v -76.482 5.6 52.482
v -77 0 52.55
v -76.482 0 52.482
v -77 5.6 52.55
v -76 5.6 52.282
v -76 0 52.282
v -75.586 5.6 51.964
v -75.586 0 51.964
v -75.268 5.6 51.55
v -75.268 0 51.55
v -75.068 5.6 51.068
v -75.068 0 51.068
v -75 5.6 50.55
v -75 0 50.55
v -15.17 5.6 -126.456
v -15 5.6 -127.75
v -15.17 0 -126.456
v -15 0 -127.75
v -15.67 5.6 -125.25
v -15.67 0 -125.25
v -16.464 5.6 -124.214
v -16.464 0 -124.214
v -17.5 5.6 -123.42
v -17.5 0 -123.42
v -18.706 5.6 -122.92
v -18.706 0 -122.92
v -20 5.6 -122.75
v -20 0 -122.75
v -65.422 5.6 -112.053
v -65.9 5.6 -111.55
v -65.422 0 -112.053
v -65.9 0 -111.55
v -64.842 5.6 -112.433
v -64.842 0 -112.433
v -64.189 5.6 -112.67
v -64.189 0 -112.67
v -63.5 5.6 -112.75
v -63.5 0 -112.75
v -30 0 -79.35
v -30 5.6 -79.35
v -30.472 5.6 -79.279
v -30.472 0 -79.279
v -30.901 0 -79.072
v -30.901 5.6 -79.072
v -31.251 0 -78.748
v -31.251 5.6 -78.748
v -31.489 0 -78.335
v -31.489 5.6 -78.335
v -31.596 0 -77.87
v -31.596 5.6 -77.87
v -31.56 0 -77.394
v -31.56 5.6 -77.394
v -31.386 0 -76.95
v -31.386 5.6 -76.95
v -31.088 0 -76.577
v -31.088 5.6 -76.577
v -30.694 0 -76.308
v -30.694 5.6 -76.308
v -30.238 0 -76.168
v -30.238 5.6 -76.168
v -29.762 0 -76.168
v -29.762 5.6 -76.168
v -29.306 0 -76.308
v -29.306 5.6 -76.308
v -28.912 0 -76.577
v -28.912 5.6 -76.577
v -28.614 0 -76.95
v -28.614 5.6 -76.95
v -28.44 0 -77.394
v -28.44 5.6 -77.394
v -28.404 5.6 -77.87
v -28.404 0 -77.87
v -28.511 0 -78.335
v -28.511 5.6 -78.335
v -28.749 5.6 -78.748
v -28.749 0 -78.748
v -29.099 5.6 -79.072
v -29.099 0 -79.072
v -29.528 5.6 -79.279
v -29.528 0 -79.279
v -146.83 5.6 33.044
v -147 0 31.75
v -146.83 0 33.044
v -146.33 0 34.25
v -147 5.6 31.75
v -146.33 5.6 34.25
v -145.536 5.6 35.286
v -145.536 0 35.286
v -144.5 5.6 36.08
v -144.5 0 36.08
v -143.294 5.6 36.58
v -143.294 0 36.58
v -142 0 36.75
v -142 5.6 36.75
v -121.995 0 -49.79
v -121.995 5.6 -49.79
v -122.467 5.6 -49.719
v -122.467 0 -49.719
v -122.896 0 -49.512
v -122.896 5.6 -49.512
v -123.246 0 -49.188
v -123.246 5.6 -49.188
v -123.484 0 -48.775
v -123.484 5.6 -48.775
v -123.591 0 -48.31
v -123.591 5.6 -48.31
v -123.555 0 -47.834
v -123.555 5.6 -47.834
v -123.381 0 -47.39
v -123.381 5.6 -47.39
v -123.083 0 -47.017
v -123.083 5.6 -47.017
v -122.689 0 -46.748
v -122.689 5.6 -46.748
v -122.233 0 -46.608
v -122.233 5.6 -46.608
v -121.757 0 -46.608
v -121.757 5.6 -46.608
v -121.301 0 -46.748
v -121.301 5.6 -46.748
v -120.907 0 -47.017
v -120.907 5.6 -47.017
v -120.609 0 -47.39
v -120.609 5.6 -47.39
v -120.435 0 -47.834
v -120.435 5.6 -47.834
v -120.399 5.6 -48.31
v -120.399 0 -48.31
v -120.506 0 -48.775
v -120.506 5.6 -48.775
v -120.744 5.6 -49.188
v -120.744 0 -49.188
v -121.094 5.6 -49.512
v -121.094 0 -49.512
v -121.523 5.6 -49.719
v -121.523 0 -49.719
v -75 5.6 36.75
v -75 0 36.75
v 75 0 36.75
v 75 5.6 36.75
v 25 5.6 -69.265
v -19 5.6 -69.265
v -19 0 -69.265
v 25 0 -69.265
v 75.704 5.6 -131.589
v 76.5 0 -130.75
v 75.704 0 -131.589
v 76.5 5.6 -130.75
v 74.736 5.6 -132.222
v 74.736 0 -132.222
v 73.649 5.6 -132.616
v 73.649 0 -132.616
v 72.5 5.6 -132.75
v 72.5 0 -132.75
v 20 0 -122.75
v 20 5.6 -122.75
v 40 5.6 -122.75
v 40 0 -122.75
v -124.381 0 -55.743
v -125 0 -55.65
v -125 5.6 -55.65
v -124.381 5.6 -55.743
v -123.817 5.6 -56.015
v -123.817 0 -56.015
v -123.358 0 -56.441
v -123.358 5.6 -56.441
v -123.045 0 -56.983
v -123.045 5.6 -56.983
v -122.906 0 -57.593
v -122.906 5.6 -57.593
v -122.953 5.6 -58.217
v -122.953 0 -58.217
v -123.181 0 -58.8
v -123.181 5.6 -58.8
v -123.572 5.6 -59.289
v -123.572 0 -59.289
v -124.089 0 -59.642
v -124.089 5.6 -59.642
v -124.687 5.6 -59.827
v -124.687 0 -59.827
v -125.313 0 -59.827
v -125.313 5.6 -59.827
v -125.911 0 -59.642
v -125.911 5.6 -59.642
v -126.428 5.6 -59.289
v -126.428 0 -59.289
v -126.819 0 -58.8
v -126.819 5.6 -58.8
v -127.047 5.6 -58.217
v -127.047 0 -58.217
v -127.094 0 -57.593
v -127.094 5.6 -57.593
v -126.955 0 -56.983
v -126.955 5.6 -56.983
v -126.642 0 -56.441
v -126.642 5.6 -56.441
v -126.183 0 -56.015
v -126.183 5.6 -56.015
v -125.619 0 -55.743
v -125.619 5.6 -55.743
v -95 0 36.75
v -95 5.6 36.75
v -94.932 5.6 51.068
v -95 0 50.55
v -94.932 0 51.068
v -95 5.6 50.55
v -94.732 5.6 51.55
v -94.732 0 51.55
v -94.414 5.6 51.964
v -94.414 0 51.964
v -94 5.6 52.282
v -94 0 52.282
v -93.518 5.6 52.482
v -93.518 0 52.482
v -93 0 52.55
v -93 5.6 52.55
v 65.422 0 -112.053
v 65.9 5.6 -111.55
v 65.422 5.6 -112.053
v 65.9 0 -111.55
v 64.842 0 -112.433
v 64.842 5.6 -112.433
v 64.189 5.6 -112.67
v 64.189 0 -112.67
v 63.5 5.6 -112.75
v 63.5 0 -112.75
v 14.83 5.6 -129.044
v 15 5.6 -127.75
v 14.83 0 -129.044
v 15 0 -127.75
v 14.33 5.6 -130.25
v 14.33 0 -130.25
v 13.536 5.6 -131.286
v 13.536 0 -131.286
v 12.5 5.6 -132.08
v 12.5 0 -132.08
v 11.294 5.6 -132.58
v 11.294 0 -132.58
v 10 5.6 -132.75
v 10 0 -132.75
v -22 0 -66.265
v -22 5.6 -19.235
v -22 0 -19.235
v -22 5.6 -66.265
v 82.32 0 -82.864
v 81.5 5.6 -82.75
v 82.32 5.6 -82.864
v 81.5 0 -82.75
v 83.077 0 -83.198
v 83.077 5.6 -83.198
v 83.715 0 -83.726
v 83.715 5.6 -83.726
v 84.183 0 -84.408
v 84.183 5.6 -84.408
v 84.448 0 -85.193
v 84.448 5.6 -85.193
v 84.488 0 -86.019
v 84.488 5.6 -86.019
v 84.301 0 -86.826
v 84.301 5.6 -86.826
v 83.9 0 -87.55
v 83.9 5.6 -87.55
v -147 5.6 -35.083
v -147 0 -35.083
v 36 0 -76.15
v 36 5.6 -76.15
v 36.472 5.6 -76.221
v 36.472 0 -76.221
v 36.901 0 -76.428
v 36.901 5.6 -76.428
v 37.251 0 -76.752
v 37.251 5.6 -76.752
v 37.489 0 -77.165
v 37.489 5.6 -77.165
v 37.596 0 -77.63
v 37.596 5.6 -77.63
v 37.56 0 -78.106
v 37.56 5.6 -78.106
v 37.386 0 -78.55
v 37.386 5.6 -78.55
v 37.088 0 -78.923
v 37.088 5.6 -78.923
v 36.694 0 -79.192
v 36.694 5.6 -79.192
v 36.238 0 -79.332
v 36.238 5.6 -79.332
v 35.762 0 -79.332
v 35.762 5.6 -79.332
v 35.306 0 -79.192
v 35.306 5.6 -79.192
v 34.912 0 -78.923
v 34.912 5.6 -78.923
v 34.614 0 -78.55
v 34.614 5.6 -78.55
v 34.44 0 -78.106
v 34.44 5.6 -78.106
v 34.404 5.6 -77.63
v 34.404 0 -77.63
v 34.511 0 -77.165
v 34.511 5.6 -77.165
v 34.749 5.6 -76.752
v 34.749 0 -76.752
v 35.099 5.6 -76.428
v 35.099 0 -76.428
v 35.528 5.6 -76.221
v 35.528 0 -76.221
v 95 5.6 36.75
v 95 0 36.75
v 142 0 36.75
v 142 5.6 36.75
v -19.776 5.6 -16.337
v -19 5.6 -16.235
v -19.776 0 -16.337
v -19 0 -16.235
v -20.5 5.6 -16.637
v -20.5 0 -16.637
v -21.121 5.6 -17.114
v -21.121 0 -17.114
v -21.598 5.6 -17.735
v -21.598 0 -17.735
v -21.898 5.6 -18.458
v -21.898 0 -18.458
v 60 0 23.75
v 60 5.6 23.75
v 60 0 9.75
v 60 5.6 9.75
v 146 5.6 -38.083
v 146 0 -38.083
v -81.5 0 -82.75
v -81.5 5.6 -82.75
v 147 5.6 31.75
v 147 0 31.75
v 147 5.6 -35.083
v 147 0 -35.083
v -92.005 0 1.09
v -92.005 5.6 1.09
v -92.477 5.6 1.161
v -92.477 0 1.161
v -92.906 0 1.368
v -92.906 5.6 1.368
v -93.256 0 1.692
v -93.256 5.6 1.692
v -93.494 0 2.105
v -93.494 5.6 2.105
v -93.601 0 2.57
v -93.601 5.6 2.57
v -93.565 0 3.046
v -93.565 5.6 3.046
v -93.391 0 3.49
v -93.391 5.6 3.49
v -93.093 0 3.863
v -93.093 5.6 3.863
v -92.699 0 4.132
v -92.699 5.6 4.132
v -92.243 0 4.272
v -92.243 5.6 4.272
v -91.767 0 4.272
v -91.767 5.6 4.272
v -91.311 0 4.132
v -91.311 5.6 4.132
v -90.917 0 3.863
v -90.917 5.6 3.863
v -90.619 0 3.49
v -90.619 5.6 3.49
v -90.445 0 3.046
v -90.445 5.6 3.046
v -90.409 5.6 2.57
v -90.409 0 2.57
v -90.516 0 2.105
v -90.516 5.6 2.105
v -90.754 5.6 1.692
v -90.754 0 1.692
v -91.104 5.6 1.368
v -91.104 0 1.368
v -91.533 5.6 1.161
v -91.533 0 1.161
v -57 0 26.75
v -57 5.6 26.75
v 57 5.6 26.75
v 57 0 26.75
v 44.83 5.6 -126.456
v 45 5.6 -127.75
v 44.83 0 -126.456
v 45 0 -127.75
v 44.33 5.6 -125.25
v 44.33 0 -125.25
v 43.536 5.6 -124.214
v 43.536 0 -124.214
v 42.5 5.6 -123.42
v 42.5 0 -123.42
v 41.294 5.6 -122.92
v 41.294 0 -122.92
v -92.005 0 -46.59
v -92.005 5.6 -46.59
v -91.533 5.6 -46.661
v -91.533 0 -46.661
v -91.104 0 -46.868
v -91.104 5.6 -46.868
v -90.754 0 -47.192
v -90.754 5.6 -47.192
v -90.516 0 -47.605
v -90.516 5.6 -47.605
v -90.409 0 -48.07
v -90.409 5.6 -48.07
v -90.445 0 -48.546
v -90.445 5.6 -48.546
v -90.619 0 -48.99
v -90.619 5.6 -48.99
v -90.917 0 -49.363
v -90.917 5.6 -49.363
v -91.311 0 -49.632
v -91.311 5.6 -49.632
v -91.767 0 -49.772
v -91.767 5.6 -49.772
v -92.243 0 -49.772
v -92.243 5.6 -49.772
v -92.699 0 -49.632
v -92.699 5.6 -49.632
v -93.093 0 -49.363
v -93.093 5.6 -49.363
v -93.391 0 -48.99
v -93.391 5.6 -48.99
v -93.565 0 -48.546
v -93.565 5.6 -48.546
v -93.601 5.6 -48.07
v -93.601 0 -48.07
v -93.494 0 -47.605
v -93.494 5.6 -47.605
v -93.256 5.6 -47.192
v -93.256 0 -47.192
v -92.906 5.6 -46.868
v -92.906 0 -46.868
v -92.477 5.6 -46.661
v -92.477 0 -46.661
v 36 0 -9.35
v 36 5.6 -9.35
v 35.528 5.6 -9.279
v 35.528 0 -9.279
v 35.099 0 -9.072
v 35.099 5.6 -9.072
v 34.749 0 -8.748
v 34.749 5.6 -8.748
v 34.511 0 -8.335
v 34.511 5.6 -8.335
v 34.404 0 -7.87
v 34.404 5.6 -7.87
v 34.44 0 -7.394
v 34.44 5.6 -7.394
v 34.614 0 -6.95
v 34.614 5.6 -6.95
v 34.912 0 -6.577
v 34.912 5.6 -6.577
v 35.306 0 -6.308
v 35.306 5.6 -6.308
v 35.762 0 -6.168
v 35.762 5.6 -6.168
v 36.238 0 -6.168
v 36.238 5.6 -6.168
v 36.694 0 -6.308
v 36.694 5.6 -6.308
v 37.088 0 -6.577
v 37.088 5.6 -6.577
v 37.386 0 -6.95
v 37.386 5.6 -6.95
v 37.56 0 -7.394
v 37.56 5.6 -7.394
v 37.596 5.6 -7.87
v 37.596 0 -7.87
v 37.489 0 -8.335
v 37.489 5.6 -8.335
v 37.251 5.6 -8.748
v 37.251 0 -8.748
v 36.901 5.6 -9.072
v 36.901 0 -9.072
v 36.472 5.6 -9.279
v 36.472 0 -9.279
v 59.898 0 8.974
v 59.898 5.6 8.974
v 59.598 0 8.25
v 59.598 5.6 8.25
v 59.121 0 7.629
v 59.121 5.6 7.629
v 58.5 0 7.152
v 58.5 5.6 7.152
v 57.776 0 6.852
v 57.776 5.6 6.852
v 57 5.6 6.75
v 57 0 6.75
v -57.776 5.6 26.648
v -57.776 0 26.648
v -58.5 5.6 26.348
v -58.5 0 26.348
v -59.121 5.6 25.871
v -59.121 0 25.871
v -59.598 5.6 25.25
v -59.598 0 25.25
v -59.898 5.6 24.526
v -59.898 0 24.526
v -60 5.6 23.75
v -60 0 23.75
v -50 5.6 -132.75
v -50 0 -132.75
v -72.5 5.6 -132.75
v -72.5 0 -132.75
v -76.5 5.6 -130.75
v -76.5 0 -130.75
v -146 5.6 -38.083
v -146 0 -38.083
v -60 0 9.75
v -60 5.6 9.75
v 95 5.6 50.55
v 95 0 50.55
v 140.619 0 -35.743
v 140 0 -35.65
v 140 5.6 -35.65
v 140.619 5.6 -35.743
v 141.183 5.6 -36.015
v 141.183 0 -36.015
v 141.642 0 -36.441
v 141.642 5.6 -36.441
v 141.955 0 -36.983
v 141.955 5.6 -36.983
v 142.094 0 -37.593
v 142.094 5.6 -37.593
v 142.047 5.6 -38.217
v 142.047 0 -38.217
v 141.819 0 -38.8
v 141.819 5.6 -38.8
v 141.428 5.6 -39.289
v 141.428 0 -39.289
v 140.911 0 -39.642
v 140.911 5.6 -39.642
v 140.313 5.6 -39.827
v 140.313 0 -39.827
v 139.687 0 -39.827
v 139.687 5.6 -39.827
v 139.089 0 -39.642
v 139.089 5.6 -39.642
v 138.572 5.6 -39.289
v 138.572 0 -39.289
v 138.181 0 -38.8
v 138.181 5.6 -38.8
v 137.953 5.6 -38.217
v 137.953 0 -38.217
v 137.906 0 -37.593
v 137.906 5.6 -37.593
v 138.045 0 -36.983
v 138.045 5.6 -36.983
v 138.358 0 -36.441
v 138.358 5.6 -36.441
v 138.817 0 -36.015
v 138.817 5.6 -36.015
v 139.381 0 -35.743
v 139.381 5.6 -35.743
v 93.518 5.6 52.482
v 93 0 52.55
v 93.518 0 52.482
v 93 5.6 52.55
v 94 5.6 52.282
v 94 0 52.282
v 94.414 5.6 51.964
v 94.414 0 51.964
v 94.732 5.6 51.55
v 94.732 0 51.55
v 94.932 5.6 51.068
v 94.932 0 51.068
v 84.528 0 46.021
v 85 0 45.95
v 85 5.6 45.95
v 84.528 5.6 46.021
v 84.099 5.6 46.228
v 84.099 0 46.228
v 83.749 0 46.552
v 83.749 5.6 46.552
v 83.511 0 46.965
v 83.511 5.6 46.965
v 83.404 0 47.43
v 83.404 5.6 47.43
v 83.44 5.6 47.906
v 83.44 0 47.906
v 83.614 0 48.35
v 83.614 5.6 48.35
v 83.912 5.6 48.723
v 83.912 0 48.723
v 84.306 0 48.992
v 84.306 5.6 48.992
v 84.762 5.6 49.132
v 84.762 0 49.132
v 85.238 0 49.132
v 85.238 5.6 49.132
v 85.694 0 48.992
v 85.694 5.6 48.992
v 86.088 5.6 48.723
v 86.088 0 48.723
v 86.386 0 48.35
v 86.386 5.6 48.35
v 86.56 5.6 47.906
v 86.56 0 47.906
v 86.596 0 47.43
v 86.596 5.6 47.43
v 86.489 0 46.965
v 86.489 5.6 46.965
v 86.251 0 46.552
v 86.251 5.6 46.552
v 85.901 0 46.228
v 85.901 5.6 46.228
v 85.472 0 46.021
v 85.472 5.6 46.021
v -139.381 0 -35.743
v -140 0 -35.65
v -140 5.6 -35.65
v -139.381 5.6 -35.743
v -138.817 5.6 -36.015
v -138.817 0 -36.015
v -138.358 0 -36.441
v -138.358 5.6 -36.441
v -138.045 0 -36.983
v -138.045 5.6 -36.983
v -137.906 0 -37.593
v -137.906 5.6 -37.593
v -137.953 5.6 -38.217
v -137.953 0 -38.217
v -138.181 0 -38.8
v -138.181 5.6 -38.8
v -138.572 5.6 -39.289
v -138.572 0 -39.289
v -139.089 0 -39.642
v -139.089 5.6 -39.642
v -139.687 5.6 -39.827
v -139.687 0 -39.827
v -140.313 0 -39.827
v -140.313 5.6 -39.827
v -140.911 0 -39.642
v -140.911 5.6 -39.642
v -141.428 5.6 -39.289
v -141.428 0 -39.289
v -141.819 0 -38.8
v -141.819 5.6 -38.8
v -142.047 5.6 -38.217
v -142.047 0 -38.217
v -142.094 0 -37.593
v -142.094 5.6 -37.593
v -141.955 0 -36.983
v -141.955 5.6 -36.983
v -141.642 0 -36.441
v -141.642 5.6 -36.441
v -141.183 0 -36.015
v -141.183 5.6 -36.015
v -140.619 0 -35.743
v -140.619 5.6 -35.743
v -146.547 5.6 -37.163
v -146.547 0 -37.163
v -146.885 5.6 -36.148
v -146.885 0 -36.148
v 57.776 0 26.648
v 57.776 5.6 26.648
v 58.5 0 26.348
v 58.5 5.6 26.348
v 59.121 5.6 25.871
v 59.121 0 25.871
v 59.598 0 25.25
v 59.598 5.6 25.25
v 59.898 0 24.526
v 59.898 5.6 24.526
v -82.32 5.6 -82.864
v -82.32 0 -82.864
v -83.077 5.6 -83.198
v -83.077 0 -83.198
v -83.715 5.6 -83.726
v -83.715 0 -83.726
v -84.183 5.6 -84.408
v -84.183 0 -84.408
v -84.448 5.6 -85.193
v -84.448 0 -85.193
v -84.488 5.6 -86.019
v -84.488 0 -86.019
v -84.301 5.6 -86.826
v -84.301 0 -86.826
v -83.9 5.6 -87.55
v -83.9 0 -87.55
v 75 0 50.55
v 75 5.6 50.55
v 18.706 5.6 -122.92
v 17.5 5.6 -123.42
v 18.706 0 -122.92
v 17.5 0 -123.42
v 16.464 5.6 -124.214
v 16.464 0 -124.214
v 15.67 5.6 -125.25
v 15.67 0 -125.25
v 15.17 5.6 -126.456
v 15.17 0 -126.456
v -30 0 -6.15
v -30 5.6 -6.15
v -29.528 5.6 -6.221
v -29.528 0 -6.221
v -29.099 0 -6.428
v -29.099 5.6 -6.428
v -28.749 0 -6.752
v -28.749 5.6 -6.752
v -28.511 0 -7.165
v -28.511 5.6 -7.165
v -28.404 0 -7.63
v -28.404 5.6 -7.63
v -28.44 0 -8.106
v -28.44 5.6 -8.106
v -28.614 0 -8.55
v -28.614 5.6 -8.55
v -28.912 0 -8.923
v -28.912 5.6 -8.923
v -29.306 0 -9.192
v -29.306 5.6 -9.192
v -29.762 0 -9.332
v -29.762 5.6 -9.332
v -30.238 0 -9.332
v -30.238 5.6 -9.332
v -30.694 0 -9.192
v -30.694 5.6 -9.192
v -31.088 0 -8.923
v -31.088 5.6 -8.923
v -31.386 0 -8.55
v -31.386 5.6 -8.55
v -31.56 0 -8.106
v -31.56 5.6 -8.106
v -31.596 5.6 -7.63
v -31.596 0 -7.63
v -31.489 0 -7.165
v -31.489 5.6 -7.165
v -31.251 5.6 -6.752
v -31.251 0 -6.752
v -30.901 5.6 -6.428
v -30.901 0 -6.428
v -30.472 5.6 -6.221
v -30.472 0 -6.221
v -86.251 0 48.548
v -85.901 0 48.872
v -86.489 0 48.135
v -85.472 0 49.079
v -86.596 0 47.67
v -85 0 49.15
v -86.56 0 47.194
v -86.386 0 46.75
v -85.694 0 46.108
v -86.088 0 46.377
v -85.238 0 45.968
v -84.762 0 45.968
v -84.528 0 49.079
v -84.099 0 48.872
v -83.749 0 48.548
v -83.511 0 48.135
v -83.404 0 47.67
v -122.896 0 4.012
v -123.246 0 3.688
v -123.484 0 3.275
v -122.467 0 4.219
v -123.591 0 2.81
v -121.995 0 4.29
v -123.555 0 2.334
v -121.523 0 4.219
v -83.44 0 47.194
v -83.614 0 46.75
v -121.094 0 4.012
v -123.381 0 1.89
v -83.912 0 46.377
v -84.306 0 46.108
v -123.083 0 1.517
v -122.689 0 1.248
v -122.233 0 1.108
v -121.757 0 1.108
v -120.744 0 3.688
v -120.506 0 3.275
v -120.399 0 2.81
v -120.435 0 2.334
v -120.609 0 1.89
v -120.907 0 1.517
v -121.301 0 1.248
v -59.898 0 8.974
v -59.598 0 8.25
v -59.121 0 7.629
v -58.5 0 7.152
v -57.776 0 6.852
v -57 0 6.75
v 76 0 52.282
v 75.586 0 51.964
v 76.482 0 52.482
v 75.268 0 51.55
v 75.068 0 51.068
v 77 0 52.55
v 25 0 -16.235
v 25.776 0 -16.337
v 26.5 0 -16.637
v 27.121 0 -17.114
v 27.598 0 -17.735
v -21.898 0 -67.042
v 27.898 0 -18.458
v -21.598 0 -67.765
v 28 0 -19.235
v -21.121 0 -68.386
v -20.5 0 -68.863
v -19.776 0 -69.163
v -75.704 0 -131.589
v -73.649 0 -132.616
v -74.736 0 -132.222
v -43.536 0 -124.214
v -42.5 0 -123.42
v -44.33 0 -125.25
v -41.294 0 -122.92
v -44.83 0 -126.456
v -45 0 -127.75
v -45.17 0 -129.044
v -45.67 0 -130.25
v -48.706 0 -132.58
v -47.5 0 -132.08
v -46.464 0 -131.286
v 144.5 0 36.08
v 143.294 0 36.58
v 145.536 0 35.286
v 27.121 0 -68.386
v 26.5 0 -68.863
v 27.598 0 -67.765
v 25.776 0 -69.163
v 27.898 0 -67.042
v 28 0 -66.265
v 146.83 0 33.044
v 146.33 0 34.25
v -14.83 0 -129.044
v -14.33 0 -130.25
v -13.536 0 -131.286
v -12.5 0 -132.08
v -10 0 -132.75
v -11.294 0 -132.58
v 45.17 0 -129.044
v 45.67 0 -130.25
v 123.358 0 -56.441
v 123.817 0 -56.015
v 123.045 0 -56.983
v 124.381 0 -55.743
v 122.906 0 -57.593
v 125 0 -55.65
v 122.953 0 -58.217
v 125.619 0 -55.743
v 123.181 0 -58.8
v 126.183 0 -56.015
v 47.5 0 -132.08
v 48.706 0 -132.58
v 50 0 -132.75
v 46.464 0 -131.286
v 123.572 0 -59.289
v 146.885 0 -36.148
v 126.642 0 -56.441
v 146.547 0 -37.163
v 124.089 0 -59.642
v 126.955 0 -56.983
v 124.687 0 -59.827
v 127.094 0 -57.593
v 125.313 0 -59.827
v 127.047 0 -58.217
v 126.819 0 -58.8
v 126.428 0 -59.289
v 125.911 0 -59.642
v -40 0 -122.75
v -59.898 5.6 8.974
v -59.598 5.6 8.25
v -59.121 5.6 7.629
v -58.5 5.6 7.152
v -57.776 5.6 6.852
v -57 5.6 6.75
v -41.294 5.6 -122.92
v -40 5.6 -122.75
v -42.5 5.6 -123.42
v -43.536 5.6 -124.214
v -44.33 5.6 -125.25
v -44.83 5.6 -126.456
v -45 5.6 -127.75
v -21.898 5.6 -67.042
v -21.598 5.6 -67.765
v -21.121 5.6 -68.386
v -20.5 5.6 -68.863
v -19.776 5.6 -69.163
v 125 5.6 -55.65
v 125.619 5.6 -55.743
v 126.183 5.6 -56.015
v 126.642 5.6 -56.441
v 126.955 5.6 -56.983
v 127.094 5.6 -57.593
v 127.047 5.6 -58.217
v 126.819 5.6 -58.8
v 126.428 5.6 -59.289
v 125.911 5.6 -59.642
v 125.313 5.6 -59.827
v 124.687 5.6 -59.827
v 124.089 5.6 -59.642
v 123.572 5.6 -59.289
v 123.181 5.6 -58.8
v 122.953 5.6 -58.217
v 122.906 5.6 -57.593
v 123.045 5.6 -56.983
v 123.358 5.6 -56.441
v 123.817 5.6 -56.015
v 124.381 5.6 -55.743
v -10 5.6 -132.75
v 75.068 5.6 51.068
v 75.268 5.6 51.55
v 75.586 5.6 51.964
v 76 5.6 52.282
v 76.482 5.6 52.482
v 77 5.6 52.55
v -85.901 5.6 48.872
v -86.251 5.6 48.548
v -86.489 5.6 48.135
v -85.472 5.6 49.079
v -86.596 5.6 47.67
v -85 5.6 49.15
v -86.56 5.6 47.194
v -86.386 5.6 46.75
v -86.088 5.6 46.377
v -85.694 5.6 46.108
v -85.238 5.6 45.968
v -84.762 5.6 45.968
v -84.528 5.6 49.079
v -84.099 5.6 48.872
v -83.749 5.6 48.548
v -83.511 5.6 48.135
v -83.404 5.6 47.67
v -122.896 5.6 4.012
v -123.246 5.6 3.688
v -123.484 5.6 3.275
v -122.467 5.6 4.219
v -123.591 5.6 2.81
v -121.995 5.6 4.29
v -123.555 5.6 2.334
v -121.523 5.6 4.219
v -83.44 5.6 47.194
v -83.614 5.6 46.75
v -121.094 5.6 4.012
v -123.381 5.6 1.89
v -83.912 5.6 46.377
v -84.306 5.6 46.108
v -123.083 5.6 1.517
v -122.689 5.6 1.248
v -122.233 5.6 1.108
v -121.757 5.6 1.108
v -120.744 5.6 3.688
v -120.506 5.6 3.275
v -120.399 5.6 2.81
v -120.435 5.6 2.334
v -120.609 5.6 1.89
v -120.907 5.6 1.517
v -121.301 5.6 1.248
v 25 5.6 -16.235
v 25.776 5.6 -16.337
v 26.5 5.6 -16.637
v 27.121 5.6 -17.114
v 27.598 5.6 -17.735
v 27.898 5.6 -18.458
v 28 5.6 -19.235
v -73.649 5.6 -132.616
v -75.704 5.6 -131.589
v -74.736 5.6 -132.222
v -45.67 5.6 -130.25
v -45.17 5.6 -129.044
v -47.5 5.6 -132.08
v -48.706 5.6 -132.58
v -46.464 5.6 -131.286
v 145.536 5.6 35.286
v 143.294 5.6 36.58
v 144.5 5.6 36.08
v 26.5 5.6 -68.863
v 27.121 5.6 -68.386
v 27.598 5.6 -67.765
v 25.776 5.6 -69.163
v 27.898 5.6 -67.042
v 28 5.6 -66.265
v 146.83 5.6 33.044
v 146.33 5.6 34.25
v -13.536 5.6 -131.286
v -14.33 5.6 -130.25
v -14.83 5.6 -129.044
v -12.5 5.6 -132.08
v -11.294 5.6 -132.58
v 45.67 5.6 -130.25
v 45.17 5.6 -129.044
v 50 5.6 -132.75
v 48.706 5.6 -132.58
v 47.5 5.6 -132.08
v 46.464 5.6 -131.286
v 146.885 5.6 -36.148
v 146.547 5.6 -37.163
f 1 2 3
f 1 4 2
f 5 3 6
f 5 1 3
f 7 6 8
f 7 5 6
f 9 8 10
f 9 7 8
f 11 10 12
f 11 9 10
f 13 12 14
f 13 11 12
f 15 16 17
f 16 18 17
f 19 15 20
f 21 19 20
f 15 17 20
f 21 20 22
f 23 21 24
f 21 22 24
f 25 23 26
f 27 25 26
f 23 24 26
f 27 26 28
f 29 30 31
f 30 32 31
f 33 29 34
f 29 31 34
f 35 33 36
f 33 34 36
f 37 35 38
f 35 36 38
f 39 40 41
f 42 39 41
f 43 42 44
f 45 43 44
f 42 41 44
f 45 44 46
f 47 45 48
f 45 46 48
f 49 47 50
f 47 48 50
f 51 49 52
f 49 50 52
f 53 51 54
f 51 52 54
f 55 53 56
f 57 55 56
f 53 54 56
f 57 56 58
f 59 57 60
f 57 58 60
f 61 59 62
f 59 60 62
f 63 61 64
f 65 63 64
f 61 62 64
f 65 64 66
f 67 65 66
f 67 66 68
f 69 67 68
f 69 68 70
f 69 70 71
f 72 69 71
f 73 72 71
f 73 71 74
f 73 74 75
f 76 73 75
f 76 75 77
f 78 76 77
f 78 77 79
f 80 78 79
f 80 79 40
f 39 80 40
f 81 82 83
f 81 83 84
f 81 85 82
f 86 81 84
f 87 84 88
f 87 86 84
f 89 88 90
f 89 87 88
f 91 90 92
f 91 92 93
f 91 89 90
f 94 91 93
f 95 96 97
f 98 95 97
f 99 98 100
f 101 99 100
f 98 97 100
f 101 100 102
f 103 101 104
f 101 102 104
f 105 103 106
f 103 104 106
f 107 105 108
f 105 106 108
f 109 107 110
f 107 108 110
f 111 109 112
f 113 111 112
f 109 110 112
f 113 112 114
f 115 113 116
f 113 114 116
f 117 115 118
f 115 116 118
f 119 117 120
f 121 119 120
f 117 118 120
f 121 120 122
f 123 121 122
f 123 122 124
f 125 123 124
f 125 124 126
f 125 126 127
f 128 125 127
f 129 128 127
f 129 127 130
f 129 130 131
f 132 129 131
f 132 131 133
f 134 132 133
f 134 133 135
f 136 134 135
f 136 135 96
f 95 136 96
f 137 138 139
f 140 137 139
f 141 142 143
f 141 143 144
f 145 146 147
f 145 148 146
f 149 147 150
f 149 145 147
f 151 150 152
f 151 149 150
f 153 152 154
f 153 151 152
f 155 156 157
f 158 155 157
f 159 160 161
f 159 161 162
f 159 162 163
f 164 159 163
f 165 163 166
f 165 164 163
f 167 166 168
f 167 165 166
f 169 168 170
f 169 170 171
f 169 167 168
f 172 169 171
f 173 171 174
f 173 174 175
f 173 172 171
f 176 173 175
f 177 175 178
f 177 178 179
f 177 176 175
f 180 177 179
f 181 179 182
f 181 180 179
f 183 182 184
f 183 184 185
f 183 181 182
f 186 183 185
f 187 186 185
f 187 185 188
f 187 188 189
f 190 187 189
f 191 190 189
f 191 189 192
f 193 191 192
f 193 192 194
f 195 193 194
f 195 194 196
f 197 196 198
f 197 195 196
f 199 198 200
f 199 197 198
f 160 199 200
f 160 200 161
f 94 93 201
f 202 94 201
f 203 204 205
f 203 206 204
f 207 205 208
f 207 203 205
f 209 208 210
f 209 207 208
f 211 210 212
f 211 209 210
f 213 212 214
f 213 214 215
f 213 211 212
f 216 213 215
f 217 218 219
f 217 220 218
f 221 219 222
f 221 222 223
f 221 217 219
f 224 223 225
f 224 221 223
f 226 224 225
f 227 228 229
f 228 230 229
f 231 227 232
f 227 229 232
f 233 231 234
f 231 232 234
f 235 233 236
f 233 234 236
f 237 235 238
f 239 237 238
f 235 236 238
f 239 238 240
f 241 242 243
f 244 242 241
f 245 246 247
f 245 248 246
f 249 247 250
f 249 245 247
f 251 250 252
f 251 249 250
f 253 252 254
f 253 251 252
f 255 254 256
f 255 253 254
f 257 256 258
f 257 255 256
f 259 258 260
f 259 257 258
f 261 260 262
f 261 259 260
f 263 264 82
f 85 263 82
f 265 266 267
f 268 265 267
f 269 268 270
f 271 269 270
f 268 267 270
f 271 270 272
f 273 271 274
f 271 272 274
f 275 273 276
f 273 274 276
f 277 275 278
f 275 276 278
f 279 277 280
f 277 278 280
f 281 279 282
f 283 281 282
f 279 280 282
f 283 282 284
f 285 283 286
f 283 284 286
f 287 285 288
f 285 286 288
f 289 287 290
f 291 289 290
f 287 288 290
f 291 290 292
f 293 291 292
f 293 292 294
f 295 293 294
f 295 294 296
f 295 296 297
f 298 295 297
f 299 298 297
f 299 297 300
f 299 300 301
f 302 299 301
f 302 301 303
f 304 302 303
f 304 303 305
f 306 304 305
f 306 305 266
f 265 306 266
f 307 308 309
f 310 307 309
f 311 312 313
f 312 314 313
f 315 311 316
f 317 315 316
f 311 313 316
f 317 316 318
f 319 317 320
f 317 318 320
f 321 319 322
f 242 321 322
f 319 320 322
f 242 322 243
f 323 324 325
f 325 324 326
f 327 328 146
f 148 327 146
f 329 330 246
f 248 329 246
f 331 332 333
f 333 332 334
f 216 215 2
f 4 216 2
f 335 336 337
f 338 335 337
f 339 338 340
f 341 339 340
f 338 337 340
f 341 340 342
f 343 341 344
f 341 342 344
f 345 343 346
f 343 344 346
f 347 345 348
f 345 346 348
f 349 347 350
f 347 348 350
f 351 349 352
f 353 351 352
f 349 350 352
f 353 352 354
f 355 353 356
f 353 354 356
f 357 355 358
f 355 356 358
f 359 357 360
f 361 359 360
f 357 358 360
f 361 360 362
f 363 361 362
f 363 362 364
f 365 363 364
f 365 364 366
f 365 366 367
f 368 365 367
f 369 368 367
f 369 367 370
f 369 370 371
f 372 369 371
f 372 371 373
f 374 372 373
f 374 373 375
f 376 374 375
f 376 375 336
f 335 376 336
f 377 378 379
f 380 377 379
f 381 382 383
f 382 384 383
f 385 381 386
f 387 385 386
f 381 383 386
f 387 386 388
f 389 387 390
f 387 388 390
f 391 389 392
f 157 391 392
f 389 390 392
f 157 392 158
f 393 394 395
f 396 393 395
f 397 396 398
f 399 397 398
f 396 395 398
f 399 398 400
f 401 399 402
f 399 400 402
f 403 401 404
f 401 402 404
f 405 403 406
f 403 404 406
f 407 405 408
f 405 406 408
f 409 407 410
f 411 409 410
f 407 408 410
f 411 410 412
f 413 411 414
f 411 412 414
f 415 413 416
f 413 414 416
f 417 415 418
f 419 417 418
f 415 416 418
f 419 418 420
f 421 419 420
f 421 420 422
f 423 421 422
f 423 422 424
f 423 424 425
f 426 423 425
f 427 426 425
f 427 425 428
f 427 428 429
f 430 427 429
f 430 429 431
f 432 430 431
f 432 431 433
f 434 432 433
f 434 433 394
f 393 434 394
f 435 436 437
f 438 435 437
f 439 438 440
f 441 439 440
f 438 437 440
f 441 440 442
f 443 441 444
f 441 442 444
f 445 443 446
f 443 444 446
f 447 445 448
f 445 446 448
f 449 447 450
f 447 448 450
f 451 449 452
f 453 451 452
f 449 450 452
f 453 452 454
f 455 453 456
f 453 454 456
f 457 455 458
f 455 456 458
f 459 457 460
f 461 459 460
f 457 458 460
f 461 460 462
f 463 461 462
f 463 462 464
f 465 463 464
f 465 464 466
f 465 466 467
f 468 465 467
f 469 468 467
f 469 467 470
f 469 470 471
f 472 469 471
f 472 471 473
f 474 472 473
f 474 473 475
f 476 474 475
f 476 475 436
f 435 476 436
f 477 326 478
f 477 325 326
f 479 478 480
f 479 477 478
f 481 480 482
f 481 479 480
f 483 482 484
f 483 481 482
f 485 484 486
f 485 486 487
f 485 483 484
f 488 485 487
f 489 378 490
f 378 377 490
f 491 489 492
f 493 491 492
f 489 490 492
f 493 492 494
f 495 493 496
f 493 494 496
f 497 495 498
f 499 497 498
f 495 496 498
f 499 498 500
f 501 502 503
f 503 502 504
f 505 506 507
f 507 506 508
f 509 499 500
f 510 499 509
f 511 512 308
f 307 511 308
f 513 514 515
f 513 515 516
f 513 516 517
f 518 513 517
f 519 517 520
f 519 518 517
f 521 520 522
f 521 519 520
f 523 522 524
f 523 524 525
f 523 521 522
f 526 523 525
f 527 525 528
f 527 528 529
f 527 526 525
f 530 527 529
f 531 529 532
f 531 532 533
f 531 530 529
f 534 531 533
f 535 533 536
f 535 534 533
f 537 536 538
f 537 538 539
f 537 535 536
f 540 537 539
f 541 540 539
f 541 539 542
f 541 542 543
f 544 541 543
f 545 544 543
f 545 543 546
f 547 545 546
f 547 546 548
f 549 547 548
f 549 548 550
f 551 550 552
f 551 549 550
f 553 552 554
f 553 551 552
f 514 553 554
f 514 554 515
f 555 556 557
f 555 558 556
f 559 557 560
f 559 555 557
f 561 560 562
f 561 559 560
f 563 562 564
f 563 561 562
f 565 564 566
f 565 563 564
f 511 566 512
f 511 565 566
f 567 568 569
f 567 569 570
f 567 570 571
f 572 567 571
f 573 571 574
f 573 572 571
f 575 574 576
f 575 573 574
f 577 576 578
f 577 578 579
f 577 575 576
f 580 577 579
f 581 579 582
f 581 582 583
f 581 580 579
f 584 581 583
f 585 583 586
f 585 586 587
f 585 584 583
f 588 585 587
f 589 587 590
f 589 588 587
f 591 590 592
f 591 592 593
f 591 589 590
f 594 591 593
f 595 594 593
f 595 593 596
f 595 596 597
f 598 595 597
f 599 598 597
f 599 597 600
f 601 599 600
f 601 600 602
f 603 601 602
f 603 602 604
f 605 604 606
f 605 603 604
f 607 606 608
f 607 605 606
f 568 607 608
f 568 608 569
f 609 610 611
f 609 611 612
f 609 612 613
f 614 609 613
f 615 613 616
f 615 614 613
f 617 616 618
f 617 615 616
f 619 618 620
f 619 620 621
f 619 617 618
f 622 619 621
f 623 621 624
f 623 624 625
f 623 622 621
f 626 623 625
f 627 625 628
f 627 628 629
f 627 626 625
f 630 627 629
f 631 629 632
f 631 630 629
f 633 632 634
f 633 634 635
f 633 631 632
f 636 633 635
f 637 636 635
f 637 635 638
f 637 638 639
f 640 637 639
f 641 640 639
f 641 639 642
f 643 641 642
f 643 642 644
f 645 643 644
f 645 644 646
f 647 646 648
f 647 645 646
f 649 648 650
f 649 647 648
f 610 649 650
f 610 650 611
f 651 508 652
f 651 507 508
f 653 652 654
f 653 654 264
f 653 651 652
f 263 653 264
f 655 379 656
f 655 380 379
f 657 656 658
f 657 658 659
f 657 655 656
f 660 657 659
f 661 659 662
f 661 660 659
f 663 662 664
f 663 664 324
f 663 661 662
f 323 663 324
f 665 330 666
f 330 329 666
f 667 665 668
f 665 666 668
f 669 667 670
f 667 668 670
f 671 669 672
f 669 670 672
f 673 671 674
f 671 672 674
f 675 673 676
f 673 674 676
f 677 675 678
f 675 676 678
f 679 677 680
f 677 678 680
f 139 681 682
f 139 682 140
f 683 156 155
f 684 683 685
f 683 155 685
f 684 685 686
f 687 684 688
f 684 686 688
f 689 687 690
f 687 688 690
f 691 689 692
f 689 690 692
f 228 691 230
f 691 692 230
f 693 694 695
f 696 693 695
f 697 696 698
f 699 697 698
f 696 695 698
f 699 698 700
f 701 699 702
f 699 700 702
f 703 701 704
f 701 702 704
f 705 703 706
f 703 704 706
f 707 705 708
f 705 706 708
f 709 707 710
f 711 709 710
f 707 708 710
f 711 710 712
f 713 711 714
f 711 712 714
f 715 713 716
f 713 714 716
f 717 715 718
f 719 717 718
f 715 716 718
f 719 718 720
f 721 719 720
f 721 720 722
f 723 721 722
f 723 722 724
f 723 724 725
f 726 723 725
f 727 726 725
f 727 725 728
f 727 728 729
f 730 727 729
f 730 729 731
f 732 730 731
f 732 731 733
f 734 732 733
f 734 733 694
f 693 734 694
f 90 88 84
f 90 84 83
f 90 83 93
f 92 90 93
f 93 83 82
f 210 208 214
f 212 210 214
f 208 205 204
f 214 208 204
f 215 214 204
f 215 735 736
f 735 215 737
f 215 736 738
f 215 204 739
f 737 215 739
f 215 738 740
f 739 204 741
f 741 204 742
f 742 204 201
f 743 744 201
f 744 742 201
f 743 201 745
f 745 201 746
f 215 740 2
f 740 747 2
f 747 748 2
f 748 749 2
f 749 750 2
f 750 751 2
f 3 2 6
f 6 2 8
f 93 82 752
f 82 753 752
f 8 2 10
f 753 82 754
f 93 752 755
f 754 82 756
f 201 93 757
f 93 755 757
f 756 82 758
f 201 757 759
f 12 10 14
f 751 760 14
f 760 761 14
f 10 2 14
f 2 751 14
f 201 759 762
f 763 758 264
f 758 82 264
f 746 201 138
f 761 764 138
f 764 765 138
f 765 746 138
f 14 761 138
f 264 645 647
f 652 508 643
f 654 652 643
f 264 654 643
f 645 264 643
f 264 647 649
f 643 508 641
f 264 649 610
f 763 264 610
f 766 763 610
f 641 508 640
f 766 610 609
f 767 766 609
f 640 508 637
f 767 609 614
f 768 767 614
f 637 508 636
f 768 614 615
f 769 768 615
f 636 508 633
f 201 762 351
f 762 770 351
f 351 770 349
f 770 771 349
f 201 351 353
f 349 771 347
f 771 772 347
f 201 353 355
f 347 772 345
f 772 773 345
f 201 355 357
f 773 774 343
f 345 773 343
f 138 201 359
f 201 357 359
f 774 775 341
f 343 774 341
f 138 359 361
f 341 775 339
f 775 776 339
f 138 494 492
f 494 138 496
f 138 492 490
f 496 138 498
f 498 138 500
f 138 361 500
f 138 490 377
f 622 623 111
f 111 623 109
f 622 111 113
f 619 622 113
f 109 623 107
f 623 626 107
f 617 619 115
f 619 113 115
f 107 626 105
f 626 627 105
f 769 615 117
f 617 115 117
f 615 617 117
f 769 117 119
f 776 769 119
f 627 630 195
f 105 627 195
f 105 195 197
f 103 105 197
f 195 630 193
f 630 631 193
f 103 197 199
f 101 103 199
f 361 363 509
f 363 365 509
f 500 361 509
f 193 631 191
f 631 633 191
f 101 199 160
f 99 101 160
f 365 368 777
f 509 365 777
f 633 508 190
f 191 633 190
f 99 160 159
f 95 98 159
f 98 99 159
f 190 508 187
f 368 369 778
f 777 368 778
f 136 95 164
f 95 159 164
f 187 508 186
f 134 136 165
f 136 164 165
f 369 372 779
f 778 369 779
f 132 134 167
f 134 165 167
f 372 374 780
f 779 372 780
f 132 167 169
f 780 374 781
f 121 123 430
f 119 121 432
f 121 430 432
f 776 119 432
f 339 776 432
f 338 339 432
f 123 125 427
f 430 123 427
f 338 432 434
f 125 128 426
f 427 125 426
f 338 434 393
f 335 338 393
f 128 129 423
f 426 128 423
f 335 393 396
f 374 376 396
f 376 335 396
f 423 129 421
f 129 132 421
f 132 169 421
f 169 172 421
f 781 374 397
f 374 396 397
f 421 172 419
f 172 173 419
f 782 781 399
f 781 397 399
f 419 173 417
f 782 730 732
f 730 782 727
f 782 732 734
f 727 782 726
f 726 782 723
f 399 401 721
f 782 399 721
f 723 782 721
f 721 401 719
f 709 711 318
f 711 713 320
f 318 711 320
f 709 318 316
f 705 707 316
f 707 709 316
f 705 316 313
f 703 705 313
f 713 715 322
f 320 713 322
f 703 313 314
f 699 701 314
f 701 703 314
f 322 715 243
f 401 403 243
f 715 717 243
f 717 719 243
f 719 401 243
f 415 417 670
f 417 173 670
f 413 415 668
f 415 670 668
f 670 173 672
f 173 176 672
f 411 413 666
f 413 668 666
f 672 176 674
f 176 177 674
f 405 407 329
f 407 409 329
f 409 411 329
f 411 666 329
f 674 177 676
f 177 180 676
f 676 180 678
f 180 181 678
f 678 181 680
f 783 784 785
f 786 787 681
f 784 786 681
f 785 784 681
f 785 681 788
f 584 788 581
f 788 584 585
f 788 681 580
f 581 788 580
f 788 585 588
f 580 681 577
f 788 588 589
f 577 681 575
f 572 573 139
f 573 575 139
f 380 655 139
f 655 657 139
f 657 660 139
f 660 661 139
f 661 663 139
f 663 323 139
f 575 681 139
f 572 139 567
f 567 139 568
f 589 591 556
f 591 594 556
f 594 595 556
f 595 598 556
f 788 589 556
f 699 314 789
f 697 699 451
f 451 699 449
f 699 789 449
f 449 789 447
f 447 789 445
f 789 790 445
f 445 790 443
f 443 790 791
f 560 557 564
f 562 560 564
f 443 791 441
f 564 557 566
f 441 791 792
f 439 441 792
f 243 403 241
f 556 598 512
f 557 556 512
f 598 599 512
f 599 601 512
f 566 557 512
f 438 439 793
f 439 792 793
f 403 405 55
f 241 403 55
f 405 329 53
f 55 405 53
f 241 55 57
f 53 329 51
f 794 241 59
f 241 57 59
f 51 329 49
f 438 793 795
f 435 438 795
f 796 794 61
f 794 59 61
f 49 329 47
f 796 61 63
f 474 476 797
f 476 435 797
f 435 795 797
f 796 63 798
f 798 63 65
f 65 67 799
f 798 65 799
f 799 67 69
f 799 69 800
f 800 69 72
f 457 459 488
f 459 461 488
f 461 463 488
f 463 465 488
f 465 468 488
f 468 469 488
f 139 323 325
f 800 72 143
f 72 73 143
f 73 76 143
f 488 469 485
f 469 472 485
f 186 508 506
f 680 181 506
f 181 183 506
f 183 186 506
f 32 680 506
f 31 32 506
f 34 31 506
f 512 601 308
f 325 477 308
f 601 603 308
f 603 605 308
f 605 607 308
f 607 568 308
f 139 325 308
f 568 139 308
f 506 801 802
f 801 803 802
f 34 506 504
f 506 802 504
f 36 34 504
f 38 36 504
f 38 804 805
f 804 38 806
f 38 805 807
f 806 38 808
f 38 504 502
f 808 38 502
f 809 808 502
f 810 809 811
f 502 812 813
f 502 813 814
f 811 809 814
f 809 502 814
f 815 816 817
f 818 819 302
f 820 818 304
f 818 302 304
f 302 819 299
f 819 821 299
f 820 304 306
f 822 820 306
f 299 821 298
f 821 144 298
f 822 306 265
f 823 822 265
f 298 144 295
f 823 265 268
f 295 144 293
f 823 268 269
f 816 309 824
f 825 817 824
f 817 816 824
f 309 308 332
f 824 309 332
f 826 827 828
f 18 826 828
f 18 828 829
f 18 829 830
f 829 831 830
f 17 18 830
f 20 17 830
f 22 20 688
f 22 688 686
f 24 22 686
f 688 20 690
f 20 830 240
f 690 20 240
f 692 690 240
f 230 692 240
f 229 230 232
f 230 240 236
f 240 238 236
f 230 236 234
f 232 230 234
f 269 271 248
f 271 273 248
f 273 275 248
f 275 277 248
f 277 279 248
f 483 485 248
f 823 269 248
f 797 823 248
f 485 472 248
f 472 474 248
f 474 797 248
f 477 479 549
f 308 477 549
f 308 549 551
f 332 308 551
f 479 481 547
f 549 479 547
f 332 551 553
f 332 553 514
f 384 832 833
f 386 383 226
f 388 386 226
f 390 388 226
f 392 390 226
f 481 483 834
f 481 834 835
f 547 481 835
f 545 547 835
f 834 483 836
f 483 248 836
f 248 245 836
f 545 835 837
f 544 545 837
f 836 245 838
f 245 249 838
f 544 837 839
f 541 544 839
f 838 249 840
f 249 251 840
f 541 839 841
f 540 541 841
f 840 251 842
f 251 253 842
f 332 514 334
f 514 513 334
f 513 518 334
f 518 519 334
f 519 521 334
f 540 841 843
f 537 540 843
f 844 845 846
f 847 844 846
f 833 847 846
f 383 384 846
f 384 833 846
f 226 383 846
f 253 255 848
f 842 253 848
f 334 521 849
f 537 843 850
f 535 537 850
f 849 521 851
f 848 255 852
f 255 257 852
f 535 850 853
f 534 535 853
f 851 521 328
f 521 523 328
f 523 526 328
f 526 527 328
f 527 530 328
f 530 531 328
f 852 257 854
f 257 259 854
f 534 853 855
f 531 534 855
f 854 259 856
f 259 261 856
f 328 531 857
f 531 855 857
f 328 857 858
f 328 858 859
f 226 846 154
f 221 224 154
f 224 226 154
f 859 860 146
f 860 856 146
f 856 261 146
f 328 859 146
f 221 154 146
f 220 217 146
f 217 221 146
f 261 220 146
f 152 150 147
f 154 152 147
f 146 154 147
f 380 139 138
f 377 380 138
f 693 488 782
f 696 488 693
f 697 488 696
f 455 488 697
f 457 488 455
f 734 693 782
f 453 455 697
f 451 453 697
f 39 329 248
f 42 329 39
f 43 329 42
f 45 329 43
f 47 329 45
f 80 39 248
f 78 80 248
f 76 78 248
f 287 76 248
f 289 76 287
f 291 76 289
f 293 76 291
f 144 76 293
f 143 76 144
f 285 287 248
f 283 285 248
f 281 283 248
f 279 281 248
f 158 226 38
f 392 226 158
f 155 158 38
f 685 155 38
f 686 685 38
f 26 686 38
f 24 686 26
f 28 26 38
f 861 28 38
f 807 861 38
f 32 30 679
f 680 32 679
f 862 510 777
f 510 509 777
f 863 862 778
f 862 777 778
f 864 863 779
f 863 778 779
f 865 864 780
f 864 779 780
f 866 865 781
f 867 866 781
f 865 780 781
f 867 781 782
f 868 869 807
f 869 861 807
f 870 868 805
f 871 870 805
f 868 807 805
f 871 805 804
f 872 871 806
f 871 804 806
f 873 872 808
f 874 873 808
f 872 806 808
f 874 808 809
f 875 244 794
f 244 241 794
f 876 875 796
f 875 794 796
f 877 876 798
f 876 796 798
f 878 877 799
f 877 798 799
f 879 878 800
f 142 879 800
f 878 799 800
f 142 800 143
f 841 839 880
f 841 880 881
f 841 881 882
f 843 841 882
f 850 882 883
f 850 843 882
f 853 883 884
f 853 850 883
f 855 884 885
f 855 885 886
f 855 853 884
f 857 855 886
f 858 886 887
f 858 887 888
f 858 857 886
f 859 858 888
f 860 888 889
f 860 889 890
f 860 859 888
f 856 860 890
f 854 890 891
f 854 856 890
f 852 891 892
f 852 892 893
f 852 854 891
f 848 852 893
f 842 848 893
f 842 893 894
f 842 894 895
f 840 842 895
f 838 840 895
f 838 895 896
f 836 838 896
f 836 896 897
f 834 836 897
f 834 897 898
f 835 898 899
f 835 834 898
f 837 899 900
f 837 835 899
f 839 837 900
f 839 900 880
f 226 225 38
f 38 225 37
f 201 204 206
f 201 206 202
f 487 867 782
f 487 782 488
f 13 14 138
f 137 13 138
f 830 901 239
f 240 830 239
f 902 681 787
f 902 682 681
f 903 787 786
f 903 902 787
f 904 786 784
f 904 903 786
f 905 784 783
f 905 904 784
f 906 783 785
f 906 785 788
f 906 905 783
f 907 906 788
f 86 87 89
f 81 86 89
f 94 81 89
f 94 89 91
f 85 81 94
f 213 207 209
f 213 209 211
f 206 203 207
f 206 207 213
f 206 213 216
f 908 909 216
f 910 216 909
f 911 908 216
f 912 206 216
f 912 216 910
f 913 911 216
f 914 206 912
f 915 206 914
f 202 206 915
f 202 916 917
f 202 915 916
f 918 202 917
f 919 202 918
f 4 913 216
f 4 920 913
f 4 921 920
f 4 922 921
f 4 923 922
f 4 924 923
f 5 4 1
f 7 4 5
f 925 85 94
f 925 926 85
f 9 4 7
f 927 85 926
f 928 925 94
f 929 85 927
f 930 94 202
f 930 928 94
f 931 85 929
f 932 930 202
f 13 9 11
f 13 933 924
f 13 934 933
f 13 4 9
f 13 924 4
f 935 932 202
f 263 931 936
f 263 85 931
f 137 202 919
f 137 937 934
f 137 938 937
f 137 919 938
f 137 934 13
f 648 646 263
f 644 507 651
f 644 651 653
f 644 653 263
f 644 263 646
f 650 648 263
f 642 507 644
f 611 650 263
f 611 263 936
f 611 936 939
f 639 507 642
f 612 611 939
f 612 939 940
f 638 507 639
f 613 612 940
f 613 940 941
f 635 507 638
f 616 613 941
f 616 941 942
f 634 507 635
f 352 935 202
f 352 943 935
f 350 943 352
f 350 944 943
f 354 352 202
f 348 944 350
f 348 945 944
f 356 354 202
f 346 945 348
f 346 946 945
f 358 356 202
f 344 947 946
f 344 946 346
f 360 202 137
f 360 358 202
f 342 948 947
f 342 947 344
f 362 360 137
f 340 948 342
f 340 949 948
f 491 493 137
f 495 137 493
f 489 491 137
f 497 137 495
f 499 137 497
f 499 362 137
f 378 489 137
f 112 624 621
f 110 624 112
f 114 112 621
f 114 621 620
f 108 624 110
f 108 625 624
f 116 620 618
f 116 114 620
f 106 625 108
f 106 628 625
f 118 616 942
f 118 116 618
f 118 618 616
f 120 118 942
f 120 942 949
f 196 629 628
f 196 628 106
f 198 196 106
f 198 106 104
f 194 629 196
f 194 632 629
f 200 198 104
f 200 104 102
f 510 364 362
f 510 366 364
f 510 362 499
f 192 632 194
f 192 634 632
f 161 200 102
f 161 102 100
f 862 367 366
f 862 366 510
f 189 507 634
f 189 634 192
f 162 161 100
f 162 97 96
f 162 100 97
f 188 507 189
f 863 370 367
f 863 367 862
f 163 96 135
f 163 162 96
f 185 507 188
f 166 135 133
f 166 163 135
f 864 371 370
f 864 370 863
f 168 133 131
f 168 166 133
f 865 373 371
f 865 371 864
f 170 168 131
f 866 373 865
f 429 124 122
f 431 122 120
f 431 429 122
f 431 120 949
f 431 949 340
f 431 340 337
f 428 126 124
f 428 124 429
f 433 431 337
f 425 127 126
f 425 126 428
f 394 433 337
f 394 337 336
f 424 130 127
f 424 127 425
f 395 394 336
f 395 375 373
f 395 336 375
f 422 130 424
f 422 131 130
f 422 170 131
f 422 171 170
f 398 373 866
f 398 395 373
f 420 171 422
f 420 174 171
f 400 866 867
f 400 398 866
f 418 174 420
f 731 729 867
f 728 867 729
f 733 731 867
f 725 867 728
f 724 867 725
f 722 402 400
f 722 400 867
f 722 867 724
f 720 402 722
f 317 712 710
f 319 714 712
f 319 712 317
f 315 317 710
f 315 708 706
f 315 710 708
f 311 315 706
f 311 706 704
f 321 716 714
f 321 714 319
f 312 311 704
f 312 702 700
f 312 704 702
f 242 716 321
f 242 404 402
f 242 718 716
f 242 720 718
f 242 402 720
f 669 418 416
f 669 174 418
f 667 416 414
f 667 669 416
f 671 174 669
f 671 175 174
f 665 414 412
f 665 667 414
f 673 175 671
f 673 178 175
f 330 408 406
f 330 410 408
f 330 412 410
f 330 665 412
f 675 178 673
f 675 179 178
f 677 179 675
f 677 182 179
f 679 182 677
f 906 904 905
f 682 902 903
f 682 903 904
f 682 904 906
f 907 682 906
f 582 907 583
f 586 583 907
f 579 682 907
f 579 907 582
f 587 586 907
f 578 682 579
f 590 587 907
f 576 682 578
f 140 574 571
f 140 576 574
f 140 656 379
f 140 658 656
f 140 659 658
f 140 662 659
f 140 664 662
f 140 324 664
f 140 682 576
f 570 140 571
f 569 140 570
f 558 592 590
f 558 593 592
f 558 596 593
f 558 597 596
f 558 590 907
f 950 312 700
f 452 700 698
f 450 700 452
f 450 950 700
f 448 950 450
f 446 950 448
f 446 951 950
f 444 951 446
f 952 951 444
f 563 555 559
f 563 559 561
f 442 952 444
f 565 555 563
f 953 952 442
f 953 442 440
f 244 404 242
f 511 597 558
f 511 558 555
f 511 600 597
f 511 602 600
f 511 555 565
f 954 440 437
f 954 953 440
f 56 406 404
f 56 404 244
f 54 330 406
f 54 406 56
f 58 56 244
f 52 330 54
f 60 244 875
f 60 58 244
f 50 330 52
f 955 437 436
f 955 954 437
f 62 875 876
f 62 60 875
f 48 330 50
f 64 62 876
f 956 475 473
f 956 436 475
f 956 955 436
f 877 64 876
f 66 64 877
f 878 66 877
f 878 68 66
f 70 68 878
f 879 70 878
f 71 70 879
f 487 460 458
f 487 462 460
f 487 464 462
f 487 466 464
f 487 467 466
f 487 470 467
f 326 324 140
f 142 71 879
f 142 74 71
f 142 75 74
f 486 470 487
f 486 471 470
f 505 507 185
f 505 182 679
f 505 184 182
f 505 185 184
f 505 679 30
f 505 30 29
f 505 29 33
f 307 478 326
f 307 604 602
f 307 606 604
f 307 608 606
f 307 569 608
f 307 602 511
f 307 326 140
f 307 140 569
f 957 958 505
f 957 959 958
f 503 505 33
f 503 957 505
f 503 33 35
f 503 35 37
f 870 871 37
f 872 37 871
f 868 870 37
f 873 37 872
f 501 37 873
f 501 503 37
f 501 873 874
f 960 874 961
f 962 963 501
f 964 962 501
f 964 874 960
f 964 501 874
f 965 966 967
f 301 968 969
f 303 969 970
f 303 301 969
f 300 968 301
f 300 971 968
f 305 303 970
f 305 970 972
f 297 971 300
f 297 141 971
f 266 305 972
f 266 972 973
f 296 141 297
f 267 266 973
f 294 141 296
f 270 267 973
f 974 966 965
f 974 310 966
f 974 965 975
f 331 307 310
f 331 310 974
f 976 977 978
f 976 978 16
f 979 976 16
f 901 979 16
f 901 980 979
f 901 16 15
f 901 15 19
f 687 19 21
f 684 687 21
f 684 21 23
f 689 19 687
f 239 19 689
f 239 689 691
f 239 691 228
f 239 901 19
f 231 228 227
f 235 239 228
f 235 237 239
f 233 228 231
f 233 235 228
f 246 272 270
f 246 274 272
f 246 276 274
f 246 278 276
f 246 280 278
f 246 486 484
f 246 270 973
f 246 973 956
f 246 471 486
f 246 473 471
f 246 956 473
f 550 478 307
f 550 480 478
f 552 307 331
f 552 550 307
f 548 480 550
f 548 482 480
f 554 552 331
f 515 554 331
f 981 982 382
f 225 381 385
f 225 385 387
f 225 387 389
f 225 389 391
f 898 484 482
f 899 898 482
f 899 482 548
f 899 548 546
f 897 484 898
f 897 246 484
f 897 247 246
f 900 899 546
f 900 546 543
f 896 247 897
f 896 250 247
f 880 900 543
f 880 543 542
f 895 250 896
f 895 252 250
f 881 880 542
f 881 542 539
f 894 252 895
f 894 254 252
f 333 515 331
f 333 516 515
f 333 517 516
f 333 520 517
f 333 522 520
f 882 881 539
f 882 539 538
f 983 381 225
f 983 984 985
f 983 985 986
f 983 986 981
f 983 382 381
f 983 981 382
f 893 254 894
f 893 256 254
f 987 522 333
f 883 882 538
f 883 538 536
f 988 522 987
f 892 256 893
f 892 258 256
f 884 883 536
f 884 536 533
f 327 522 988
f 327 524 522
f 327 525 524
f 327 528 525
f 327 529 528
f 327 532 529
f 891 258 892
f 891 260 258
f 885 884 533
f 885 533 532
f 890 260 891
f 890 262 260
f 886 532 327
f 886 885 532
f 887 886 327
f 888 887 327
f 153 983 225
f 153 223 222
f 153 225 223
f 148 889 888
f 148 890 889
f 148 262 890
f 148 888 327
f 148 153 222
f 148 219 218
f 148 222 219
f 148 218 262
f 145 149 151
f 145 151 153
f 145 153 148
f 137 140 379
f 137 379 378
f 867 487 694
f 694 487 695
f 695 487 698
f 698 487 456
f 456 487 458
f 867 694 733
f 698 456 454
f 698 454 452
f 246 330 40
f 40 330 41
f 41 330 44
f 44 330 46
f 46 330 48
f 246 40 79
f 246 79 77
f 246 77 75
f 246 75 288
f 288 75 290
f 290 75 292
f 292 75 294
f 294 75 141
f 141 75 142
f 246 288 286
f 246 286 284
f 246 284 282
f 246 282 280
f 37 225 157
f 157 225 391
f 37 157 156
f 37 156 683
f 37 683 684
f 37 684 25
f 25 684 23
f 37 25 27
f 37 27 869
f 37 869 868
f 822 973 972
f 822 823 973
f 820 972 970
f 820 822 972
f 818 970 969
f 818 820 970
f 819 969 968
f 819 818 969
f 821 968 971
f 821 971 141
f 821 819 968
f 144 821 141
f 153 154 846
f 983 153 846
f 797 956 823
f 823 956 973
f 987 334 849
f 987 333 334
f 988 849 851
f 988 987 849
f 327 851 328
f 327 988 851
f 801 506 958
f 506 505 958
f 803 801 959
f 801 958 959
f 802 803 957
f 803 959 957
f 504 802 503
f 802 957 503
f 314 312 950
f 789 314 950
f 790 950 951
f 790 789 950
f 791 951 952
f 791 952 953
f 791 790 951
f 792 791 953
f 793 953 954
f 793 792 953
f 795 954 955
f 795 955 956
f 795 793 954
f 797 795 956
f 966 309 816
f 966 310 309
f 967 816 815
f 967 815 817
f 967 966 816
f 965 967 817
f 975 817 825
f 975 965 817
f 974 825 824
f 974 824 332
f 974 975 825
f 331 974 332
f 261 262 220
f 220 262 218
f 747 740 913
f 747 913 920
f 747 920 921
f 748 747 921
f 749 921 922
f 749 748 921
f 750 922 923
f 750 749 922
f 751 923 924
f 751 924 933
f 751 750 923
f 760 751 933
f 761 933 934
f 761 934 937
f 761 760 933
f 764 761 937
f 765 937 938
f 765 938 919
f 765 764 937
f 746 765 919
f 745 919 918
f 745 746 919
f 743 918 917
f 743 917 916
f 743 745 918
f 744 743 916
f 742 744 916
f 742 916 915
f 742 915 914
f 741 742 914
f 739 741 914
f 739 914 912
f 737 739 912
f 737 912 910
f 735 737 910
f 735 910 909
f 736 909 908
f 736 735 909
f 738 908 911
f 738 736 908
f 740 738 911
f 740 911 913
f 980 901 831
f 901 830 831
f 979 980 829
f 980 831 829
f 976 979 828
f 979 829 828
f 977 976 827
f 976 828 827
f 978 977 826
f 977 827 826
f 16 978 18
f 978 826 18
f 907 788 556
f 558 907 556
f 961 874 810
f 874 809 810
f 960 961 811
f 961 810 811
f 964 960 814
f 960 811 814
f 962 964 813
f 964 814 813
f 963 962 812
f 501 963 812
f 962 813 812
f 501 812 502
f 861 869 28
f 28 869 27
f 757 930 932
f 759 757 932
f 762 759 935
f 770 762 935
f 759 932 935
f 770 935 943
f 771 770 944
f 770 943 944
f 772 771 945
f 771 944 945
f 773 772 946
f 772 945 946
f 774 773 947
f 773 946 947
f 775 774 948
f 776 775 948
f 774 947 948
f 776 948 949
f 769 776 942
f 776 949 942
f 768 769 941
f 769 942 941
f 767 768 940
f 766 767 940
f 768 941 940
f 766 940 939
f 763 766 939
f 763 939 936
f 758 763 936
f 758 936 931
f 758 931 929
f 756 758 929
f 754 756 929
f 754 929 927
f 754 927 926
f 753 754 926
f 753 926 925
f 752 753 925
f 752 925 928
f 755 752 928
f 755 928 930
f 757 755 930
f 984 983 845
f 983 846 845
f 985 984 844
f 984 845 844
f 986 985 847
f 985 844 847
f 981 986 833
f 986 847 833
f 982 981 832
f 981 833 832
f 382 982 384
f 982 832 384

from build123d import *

# Parameters (mm, degrees)
SKETCH_1_R          = 2.1
EXTRUDE_1_DEPTH     = 5.6
SKETCH_2_W          = 20
SKETCH_2_H          = 15.8
SKETCH_2_R          = 1.6
EXTRUDE_2_DEPTH     = 5.6
SKETCH_3_R          = 1.6
CUT_EXTRUDE_1_DEPTH = 199.148738326
SKETCH_4_W          = 50
SKETCH_4_H          = 53.03030303
SKETCH_4_W_2        = 120
SKETCH_4_H_2        = 20
CUT_EXTRUDE_2_DEPTH = 199.148738326
SKETCH_6_W          = 90
SKETCH_6_H          = 10
CUT_EXTRUDE_3_DEPTH = 199.148738326
SKETCH_7_W          = 30
SKETCH_7_H          = 10
EXTRUDE_3_DEPTH     = 5.6
FILLET_1_R          = 3
FILLET_2_R          = 5
FILLET_3_R          = 2


with BuildPart() as part:
    # Sketch 1 → Extrude 1 (new body)
    with BuildSketch(Plane(origin=(0, 0, 0), x_dir=(1, 0, 0), z_dir=(0, 1, 0))):
        Polygon((-147, 36.75), (-147, -36.75), (147, -36.75), (147, 36.75), (75, 132.75), (-75, 132.75), align=None)
        with Locations(Location((140, 37.75, 0), (0, 0, 270))):
            Circle(SKETCH_1_R, mode=Mode.SUBTRACT)
        with Locations(Location((-140, 37.75, 0), (0, 0, 270))):
            Circle(SKETCH_1_R, mode=Mode.SUBTRACT)
        with Locations(Location((125, 57.75, 0), (0, 0, 270))):
            Circle(SKETCH_1_R, mode=Mode.SUBTRACT)
        with Locations(Location((-125, 57.75, 0), (0, 0, 270))):
            Circle(SKETCH_1_R, mode=Mode.SUBTRACT)
    extrude(amount=EXTRUDE_1_DEPTH)

    # Sketch 2 → Extrude 2 (add)
    # profile 1 of 2: a face of its own
    with BuildSketch(Plane(origin=(0, 0, 0), x_dir=(1, 0, 0), z_dir=(0, 1, 0))):
        with Locations((-85, -44.65)):
            Rectangle(SKETCH_2_W, SKETCH_2_H)
        with Locations(Location((-85, -47.55, 0), (0, 0, 270))):
            Circle(SKETCH_2_R, mode=Mode.SUBTRACT)
    # profile 2 of 2: a face of its own
    with BuildSketch(Plane(origin=(0, 0, 0), x_dir=(1, 0, 0), z_dir=(0, 1, 0))):
        with Locations((85, -44.65)):
            Rectangle(SKETCH_2_W, SKETCH_2_H)
        with Locations(Location((85, -47.55, 0), (0, 0, 90))):
            Circle(SKETCH_2_R, mode=Mode.SUBTRACT)
    extrude(amount=EXTRUDE_2_DEPTH)

    # Sketch 3 → Cut-Extrude 1 (cut, through all)
    with BuildSketch(Plane(origin=(0, 5.6, 0), x_dir=(1, 0, 0), z_dir=(0, 1, 0))):
        with Locations(Location((36, 77.75, 0), (0, 0, 270))):
            Circle(SKETCH_3_R)
        with Locations(Location((-30, 77.75, 0), (0, 0, 90))):
            Circle(SKETCH_3_R)
        with Locations(Location((-30, 7.75, 0), (0, 0, 270))):
            Circle(SKETCH_3_R)
        with Locations(Location((36, 7.75, 0), (0, 0, 90))):
            Circle(SKETCH_3_R)
        with Locations(Location((-92.005, 48.19, 0), (0, 0, 270))):
            Circle(SKETCH_3_R)
        with Locations(Location((-92.005, -2.69, 0), (0, 0, 90))):
            Circle(SKETCH_3_R)
        with Locations(Location((-121.995, -2.69, 0), (0, 0, 270))):
            Circle(SKETCH_3_R)
        with Locations(Location((-121.995, 48.19, 0), (0, 0, 90))):
            Circle(SKETCH_3_R)
    extrude(amount=-CUT_EXTRUDE_1_DEPTH, mode=Mode.SUBTRACT)

    # Sketch 4 → Cut-Extrude 2 (cut, through all)
    with BuildSketch(Plane(origin=(0, 5.6, 0), x_dir=(1, 0, 0), z_dir=(0, 1, 0))):
        Polygon((-87.5, 82.75), (87.5, 82.75), (65, 112.75), (-65, 112.75), align=None)
        with Locations((3, 42.75)):
            Rectangle(SKETCH_4_W, SKETCH_4_H)
        with Locations((0, -16.75)):
            Rectangle(SKETCH_4_W_2, SKETCH_4_H_2)
    extrude(amount=-CUT_EXTRUDE_2_DEPTH, mode=Mode.SUBTRACT)

    # Sketch 6 → Cut-Extrude 3 (cut, through all)
    with BuildSketch(Plane(origin=(0, 5.6, 0), x_dir=(1, 0, 0), z_dir=(0, 1, 0))):
        with Locations((0, 127.75)):
            Rectangle(SKETCH_6_W, SKETCH_6_H)
    extrude(amount=-CUT_EXTRUDE_3_DEPTH, mode=Mode.SUBTRACT)

    # Sketch 7 → Extrude 3 (add)
    with BuildSketch(Plane(origin=(0, 5.6, 0), x_dir=(1, 0, 0), z_dir=(0, 1, 0))):
        with Locations((0, 127.75)):
            Rectangle(SKETCH_7_W, SKETCH_7_H)
    extrude(amount=-EXTRUDE_3_DEPTH)

    # Fillet 1
    fillet_1_edges = [part.edges().sort_by_distance(p)[0] for p in [
        (-87.5, 2.8, -82.75),
        (-65, 2.8, -112.75),
        (65, 2.8, -112.75),
        (87.5, 2.8, -82.75),
        (28, 2.8, -69.265151515),
        (28, 2.8, -16.234848485),
        (-22, 2.8, -16.234848485),
        (-22, 2.8, -69.265151515),
        (60, 2.8, 26.75),
        (-60, 2.8, 26.75),
        (-60, 2.8, 6.75),
        (60, 2.8, 6.75),
    ]]
    fillet(fillet_1_edges, radius=FILLET_1_R)

    # Fillet 2
    fillet_2_edges = [part.edges().sort_by_distance(p)[0] for p in [
        (-147, 2.8, 36.75),
        (-147, 2.8, -36.75),
        (-75, 2.8, -132.75),
        (75, 2.8, -132.75),
        (147, 2.8, -36.75),
        (147, 2.8, 36.75),
        (45, 2.8, -132.75),
        (45, 2.8, -122.75),
        (-45, 2.8, -132.75),
        (-45, 2.8, -122.75),
        (15, 2.8, -132.75),
        (15, 2.8, -122.75),
        (-15, 2.8, -132.75),
        (-15, 2.8, -122.75),
    ]]
    fillet(fillet_2_edges, radius=FILLET_2_R - 0.0001)  # a hair under: the kernel refuses the full size

    # Fillet 3
    fillet_3_edges = [part.edges().sort_by_distance(p)[0] for p in [
        (-95, 2.8, 52.55),
        (-75, 2.8, 52.55),
        (75, 2.8, 52.55),
        (95, 2.8, 52.55),
    ]]
    fillet(fillet_3_edges, radius=FILLET_3_R)


solid = part.part
